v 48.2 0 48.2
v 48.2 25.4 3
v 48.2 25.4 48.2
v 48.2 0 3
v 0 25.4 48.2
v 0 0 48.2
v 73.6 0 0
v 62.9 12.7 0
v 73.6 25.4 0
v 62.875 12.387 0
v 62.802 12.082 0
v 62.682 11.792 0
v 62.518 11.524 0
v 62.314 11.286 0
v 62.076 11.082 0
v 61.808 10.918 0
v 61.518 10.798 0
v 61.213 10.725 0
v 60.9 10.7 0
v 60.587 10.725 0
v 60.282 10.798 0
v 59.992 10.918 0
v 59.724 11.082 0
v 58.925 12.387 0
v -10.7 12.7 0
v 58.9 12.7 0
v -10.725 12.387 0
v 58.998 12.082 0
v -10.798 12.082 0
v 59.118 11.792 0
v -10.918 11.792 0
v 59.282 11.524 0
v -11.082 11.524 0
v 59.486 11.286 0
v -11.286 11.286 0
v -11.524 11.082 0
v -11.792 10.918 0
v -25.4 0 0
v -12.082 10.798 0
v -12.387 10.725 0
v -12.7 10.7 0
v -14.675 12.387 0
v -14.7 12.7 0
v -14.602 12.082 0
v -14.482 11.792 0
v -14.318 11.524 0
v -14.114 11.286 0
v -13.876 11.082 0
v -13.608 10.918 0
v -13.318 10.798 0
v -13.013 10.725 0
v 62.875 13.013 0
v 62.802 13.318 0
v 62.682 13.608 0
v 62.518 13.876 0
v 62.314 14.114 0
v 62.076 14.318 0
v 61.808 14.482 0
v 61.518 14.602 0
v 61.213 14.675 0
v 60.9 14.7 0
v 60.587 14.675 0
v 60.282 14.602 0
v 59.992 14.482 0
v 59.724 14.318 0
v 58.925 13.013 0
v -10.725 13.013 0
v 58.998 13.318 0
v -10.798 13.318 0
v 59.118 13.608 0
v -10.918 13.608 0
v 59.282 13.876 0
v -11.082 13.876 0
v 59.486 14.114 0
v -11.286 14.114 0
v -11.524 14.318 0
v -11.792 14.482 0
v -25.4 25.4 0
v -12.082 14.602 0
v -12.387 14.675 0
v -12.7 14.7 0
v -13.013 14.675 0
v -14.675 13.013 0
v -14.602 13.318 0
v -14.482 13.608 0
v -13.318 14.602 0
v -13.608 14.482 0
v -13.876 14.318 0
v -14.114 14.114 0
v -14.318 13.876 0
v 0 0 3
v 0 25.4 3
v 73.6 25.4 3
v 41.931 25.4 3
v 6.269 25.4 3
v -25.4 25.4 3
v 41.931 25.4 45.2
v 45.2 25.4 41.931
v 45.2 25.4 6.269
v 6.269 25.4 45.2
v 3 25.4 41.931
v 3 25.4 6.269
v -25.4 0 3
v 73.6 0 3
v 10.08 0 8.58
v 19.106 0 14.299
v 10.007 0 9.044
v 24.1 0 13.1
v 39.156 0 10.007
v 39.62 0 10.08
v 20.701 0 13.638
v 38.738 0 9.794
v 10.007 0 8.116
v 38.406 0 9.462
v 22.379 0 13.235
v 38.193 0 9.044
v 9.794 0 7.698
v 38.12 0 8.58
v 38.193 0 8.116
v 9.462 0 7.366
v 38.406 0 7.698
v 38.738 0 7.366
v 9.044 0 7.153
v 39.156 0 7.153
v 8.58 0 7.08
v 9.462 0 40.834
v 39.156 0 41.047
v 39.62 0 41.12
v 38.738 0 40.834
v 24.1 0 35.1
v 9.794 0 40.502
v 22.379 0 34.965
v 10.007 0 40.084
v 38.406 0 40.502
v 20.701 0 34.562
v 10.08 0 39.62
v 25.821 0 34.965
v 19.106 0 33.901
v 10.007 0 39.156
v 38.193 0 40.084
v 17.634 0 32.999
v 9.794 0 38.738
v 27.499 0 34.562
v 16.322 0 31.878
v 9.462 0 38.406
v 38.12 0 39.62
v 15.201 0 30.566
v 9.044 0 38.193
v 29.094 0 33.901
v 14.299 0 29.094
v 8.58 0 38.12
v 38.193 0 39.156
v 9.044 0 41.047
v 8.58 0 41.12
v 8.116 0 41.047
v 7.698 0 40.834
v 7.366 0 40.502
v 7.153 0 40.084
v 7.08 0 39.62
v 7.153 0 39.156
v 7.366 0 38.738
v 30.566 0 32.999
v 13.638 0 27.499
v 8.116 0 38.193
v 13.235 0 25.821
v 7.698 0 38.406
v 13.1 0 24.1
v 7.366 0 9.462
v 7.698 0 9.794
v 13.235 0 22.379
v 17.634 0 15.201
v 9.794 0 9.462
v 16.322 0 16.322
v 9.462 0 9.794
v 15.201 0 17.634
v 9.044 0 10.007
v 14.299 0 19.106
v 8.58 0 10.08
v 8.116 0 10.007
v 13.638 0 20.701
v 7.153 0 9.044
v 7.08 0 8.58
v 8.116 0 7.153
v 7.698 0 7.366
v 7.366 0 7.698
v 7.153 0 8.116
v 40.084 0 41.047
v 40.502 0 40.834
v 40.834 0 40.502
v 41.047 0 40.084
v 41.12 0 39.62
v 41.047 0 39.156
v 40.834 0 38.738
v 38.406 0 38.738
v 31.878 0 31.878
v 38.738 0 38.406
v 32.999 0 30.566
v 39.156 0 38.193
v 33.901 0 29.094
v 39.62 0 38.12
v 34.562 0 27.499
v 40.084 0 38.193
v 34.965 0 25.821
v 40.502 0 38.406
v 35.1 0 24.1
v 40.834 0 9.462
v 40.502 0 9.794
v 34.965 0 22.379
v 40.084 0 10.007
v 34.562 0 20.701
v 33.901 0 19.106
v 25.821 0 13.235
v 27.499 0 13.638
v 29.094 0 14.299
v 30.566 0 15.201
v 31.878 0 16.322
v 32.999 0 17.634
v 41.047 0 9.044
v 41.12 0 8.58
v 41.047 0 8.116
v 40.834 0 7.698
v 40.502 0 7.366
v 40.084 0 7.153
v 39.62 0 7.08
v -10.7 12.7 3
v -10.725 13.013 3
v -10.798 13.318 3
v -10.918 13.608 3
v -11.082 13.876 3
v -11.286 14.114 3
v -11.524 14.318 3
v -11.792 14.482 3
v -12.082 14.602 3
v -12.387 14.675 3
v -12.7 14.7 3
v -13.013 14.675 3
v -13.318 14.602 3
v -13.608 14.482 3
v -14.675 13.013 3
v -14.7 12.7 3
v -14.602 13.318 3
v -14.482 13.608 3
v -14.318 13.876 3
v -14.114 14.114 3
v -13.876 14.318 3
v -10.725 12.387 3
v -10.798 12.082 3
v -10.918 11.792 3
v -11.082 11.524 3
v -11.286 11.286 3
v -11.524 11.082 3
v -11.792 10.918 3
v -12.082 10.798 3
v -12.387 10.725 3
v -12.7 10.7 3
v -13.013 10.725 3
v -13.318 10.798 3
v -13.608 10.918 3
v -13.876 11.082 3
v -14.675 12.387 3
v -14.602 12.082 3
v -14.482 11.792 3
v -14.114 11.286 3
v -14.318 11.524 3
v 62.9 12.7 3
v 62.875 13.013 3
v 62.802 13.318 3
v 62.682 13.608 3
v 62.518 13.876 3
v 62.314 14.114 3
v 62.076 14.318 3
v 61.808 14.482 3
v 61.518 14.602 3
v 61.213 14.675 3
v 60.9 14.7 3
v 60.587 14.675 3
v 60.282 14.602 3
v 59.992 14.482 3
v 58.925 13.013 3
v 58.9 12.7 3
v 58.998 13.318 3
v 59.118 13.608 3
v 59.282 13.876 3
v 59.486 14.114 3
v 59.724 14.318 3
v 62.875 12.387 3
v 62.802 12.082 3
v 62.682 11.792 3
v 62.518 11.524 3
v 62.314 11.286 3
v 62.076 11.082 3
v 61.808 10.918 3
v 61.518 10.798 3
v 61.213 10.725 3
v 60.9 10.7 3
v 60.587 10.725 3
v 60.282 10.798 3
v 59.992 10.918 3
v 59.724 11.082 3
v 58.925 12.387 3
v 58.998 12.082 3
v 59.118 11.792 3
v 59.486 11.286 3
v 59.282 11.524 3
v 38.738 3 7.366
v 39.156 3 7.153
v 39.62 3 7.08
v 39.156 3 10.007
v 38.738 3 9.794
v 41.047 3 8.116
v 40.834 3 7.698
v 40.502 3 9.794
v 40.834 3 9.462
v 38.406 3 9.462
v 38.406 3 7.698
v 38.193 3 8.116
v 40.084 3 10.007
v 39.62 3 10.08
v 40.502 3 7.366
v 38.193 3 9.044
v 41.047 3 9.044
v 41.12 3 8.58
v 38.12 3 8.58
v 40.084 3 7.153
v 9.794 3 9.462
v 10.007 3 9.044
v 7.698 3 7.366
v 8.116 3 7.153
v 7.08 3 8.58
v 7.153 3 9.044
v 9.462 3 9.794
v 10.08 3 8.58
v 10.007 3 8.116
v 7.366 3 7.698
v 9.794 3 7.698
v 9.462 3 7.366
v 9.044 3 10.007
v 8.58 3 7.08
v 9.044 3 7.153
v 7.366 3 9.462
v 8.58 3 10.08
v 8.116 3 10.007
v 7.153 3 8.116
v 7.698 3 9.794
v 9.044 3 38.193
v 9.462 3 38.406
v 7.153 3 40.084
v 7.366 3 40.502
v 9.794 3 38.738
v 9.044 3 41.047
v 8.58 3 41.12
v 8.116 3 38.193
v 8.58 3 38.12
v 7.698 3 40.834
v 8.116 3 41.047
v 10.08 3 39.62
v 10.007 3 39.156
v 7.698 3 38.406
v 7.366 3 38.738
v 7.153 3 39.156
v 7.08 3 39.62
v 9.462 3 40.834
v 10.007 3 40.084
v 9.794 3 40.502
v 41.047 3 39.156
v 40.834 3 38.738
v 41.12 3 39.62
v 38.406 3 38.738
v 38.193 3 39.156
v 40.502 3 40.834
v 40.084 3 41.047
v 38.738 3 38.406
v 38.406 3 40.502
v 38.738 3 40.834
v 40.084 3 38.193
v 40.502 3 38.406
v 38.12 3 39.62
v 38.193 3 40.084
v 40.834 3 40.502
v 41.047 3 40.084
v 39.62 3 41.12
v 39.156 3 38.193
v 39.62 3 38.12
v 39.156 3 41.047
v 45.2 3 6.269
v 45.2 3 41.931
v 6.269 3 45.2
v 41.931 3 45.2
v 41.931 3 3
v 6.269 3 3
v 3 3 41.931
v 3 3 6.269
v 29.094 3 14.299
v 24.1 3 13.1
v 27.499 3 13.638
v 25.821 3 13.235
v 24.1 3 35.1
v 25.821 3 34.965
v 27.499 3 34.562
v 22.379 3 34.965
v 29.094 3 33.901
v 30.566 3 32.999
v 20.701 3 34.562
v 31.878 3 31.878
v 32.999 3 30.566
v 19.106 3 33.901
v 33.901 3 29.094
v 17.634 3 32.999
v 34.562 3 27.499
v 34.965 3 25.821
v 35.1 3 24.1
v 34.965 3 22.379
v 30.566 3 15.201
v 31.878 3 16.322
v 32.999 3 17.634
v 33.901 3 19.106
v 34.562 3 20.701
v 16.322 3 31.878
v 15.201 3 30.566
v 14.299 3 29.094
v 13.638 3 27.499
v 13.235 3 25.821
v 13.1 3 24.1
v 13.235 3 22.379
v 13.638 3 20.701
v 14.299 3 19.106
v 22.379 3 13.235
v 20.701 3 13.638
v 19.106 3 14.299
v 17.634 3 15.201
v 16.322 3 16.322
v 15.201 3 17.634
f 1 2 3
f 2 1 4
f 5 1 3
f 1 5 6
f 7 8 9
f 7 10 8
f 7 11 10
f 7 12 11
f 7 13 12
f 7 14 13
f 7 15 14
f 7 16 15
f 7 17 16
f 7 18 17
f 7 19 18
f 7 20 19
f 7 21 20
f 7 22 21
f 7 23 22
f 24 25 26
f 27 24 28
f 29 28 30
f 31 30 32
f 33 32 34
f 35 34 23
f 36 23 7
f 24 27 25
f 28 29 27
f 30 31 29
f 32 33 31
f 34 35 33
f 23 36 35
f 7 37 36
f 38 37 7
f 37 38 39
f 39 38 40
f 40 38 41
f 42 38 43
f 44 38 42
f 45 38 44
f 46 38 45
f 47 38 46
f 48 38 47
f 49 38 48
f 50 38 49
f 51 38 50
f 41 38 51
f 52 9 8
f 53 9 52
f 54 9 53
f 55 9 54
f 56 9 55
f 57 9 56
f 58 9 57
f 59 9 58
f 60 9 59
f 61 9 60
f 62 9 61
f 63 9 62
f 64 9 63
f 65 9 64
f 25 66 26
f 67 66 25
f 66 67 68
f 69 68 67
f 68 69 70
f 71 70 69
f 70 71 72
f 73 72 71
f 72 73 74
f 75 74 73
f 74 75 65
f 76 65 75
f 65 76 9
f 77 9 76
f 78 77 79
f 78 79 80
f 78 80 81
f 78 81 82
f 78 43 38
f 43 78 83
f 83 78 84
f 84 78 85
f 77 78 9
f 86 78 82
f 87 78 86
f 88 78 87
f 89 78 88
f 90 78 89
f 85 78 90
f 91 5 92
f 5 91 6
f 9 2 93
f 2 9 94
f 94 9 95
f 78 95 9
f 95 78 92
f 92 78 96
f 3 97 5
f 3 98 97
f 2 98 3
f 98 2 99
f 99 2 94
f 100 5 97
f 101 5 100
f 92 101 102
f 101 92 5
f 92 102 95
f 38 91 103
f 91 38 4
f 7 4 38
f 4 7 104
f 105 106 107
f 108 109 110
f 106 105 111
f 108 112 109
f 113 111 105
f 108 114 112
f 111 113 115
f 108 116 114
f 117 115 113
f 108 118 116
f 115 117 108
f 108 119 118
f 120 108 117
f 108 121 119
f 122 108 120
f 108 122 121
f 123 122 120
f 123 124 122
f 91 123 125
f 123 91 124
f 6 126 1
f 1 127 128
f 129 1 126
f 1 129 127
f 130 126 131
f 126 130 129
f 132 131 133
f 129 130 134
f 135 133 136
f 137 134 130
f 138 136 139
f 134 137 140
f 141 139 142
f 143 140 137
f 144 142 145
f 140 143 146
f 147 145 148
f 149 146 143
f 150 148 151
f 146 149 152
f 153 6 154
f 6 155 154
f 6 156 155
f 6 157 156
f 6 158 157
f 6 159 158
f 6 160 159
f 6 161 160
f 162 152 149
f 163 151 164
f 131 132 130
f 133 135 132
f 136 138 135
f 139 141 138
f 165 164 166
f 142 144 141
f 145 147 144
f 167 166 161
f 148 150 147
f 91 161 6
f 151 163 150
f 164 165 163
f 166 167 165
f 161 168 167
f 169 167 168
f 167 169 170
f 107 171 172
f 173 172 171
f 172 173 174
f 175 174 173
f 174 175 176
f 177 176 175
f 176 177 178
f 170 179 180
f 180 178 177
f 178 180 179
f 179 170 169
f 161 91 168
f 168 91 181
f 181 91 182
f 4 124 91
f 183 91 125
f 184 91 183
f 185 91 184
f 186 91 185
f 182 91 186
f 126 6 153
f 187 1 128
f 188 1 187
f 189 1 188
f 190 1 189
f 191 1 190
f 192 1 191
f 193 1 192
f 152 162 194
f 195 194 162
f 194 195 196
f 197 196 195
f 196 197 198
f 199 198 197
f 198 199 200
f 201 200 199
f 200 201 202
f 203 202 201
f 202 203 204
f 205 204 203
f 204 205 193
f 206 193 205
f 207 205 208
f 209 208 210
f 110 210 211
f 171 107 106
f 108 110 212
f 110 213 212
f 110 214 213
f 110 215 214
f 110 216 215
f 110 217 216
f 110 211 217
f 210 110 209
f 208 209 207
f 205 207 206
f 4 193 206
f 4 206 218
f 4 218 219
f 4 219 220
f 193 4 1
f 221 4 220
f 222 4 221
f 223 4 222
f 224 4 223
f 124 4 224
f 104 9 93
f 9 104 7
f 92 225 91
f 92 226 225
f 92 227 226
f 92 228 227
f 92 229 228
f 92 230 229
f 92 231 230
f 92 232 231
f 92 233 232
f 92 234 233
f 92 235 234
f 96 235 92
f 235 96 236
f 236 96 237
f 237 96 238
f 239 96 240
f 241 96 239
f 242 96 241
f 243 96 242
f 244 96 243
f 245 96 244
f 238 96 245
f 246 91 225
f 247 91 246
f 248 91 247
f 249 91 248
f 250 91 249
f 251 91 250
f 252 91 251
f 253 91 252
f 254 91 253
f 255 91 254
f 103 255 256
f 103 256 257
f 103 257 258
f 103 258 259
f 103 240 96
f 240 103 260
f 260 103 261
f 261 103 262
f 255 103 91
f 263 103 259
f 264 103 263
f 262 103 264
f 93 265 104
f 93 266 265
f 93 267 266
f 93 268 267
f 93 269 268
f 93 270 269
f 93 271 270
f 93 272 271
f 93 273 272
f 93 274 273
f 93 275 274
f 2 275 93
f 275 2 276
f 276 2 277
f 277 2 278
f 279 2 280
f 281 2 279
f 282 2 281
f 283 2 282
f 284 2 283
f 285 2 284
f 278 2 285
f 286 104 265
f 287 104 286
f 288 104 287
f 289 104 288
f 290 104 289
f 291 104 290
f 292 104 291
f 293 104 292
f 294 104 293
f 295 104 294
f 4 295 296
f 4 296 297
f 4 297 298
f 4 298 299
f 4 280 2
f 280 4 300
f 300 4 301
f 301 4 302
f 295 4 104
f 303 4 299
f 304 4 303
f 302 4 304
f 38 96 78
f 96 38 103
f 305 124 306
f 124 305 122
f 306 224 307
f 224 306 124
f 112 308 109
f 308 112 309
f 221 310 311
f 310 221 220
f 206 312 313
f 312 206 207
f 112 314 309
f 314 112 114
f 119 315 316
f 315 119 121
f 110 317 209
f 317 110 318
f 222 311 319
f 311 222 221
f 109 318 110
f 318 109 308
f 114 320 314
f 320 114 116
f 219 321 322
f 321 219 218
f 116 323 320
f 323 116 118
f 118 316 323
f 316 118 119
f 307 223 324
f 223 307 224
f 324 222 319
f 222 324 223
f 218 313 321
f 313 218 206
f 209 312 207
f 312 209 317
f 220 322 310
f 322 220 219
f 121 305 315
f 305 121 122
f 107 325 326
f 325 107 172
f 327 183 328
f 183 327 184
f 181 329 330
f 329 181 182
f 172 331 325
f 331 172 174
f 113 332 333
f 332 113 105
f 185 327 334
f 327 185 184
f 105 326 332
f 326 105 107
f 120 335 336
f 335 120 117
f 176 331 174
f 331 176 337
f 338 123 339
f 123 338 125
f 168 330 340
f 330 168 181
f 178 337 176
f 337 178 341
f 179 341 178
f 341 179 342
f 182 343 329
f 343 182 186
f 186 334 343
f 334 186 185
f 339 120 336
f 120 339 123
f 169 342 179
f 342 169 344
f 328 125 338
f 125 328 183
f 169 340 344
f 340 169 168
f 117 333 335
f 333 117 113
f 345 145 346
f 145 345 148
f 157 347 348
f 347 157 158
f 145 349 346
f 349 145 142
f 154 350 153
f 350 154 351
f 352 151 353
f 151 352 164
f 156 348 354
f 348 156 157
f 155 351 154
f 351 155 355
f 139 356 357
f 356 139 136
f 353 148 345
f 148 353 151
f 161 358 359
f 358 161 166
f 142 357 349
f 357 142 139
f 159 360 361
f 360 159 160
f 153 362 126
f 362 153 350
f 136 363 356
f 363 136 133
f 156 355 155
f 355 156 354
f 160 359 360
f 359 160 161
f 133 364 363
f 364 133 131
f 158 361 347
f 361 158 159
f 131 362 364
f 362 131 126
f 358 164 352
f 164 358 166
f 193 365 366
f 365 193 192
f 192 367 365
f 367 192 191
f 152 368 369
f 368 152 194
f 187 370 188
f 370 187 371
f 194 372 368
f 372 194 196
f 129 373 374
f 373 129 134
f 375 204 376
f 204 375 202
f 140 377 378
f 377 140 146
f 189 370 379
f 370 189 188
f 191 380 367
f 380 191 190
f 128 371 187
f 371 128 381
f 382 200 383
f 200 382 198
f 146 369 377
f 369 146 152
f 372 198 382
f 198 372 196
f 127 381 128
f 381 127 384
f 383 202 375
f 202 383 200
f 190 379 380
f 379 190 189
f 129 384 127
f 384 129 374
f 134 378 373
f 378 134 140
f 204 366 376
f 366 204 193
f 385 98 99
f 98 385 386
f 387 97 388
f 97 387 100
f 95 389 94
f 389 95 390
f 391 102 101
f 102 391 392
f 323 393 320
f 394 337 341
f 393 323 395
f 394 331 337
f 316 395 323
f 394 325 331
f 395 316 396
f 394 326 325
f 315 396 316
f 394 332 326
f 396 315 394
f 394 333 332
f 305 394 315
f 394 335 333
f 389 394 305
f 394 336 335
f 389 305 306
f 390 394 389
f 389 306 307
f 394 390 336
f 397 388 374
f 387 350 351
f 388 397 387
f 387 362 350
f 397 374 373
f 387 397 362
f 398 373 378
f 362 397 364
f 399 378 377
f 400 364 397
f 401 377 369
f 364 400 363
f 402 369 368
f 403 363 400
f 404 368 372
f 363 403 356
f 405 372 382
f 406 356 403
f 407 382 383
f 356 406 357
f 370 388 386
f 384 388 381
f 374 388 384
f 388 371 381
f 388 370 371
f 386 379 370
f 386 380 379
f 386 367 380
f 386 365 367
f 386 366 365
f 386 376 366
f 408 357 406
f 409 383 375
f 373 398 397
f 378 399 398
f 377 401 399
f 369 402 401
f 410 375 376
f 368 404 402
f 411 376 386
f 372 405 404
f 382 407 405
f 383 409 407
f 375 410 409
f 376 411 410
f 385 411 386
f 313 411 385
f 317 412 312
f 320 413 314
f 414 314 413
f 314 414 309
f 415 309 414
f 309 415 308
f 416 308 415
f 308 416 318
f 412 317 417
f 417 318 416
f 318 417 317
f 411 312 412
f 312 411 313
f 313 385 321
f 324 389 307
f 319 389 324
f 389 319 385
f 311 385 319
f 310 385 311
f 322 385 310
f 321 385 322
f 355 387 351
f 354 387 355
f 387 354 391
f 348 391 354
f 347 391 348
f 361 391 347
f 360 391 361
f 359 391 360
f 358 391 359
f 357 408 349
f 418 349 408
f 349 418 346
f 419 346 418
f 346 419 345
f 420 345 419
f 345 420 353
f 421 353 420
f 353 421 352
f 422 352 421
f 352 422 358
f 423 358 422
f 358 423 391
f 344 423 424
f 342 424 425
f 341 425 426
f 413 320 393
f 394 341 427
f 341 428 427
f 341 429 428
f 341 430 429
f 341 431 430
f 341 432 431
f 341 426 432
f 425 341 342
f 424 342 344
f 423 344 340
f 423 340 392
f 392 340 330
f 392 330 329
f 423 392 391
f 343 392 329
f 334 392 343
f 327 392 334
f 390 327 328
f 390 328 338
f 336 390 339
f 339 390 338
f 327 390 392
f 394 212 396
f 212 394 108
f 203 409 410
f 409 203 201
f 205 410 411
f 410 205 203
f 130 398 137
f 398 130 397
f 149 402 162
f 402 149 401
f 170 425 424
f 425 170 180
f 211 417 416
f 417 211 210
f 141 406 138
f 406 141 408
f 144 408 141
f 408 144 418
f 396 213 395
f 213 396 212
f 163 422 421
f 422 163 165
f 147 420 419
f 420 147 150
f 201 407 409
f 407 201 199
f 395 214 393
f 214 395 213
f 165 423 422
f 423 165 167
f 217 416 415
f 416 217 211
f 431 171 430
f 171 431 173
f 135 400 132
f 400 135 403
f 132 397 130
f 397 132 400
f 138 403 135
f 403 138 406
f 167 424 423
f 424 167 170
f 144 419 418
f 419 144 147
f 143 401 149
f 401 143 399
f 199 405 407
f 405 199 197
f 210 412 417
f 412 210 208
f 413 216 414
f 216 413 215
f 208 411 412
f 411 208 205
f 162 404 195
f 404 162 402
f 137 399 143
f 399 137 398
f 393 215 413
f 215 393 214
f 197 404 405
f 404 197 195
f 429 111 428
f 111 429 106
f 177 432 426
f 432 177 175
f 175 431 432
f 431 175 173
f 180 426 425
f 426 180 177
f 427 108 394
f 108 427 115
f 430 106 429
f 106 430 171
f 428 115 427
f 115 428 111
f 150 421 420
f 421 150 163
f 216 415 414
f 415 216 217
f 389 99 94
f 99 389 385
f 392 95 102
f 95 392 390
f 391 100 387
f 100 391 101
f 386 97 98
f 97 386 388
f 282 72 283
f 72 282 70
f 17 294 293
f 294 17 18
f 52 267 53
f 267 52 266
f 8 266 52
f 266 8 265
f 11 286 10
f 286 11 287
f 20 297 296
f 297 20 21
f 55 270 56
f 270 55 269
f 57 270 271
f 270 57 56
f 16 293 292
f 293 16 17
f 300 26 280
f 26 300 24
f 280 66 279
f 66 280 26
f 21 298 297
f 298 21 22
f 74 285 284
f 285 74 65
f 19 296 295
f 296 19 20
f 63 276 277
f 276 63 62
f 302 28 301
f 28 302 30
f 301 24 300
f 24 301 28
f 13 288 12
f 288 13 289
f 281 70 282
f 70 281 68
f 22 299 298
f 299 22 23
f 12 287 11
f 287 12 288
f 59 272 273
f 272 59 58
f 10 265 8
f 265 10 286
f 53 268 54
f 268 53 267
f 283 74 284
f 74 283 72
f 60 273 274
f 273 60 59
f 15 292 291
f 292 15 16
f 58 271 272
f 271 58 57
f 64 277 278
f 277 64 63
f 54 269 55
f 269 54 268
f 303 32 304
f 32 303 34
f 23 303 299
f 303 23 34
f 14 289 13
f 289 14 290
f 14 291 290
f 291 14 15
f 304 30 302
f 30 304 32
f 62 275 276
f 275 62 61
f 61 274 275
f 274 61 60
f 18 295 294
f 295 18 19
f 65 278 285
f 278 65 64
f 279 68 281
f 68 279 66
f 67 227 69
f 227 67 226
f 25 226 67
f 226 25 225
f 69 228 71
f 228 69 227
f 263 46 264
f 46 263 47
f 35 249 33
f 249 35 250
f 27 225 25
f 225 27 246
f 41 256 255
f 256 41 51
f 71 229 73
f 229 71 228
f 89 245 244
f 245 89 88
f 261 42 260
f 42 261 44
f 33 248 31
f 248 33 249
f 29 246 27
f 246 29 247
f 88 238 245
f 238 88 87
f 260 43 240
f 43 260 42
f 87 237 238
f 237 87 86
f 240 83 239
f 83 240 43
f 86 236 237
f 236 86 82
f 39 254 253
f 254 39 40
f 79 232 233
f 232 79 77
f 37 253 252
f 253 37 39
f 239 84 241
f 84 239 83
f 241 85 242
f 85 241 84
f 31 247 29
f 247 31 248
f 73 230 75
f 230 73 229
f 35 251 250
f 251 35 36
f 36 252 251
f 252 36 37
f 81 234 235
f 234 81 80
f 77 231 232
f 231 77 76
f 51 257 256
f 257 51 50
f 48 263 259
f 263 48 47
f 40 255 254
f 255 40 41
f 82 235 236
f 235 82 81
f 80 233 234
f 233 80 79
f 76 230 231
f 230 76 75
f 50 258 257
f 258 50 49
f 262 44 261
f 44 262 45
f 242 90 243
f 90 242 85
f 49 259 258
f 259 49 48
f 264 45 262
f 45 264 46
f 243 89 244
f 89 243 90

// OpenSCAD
// [FL_INDEX: keywords="openscad, 3d_parametric, NEMA17_bracket_created_parametrically, csg_solid" | COT="Parametric OpenSCAD design from 3DCodeverse"]
// Title: NEMA17 bracket created parametrically

// preview[view:north west, tilt:top diagonal]

bracket_wall_width = 3;
bracket_depth = 25.4; // 1 inch
//lengths of tabs
bracket_flaps =  25.4;
bracket_bolts_diameter = 4; 
bevel_inner_corners = "yes"; //[yes,no]


module NemaForCSG(nema_side, nema_depth, nema_bolts, nema_crown, nema_bolt_radious)
{
	//bevel corners
	r1 = nema_side/2- nema_bolts/2;
	r2 = sqrt(2)* r1 ;
	r=(r2-r1)*2;
	
	
	difference()
	{
	
		union()
		{
			cube([nema_side,nema_depth,nema_side]);
	
			translate( [nema_side/2,0,nema_side/2]) 
				rotate(90,[1,0,0]) 
				{
					cylinder(r = nema_crown, h = 30, $fn = 40,center=true);
				}

			translate( [nema_side/2,0,nema_side/2])
			{
				//bolt holes
				for(j=[1:4])
				{		
					rotate(90*j,[0,1,0]) 
						translate( [nema_bolts/2.0,0,nema_bolts/2.0]) 
							rotate(-90,[1,0,0]) 
							{
								cylinder(r = nema_bolt_radious, h = 30, $fn = 20,center=true);
							}
				}
			}
		}	

		if (bevel_inner_corners == "yes")
		{
			//bevel
			translate( [nema_side/2,0,nema_side/2])
			{
			
				for(j=[1:4])
				{
					rotate(90*j,[0,1,0]) 
						translate( [nema_side/2,nema_depth/2,nema_side/2]) 
					rotate(45,[0,1,0]) 
					cube([30,50,r], center = true);
				}
			}
		}
	}

}

//units are in millimeters
M3 = 3.0/2.0;
nema17_side = 42.2;
nema17_bolts = 31.04;
nema17_depth = 33.8;
nema17_crown = 11;
nema17_bolt_radious = M3;

difference()
{
	union()
	{
		cube([nema17_side+bracket_wall_width*2, bracket_depth, nema17_side+bracket_wall_width*2]);

		translate([-bracket_flaps,0,0])
			cube([nema17_side+(bracket_wall_width+bracket_flaps)*2,bracket_depth,bracket_wall_width]);		
	}

	translate([bracket_wall_width + nema17_side + bracket_wall_width + bracket_flaps/2,bracket_depth/2,0])
		cylinder(r = bracket_bolts_diameter/2, h = 30, $fn = 40,center=true);

	translate([-bracket_flaps/2,bracket_depth/2,0])
		cylinder(r = bracket_bolts_diameter/2, h = 30, $fn = 40,center=true);


	translate([bracket_wall_width,bracket_wall_width,bracket_wall_width])
	NemaForCSG(nema17_side, nema17_depth, nema17_bolts, nema17_crown, nema17_bolt_radious);

}
